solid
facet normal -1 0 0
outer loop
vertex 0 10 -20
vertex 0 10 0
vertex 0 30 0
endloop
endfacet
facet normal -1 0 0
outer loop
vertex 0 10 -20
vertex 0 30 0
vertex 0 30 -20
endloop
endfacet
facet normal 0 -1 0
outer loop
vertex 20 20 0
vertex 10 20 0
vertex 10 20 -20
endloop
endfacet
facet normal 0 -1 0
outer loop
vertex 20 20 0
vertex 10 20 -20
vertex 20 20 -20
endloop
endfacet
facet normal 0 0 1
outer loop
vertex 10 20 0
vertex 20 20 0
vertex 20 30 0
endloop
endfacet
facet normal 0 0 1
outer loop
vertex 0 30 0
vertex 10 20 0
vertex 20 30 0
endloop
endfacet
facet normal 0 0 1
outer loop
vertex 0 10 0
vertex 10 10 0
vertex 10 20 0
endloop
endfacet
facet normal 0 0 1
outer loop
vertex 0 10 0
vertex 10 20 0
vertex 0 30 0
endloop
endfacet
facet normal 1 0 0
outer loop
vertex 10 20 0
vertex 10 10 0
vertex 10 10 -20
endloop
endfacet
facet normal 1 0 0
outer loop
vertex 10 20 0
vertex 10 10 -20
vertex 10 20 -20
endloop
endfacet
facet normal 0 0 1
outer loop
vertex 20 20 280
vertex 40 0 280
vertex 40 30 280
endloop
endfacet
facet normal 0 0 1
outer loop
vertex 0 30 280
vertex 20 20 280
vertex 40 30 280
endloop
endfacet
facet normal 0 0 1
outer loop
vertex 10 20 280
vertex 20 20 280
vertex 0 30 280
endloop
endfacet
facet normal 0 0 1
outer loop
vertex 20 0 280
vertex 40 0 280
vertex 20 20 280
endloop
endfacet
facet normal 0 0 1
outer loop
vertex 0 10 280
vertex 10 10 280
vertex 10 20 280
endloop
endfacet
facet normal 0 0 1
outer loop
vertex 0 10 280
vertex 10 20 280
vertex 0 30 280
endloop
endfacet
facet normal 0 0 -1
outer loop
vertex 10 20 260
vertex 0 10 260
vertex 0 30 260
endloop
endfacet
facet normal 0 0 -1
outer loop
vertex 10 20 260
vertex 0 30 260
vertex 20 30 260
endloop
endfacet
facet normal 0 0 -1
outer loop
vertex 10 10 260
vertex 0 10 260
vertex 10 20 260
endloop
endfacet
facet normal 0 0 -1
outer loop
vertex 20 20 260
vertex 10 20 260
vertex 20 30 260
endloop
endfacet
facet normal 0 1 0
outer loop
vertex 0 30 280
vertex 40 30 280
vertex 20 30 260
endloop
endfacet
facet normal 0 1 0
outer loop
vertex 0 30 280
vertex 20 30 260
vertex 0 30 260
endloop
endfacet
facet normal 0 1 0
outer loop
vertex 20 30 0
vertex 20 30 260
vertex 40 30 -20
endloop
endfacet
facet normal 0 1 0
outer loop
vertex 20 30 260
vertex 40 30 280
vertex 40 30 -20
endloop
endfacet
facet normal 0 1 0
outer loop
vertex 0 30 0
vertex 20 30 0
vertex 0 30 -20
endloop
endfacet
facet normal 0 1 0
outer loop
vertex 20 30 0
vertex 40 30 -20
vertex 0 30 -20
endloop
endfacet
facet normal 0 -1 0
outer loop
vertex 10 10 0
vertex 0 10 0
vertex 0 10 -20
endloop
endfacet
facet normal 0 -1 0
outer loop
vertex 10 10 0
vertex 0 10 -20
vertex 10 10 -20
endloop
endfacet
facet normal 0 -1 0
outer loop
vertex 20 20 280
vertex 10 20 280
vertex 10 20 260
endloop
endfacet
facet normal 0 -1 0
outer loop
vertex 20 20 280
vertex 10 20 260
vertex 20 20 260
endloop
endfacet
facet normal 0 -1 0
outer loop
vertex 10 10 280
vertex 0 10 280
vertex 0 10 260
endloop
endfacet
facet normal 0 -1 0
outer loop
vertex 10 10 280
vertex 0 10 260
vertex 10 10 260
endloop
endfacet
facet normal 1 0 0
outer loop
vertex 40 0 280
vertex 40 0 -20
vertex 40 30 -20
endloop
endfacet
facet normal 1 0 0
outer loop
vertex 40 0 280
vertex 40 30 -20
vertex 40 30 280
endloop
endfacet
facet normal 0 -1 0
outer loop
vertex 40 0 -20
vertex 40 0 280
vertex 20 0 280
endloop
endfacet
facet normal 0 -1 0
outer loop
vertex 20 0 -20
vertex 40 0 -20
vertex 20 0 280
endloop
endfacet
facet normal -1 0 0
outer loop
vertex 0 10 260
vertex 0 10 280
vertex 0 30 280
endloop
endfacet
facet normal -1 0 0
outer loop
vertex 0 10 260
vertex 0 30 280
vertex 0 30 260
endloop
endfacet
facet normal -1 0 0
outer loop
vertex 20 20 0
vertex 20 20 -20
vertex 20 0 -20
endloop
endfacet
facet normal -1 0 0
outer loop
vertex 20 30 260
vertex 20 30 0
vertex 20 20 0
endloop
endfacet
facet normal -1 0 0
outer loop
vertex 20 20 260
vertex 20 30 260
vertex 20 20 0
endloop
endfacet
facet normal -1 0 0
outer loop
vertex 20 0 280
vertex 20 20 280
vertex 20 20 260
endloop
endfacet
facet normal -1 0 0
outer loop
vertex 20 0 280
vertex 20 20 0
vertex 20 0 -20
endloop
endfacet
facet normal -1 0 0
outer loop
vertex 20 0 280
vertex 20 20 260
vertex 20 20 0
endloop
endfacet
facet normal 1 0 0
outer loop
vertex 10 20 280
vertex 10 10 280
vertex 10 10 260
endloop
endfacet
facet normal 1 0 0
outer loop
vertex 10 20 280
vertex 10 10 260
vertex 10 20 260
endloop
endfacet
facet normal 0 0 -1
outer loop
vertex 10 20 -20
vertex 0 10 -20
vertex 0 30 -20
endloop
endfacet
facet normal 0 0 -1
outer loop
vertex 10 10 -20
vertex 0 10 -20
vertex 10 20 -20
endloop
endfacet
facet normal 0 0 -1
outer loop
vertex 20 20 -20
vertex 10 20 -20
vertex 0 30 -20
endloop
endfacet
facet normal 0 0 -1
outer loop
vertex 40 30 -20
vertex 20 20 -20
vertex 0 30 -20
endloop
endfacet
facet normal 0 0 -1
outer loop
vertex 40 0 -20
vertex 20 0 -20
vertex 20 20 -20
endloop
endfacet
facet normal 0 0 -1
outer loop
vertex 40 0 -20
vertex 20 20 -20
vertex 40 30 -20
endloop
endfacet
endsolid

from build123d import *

# Parameters (mm, degrees)
BOSS_EXTRUDE1_DEPTH     = 30
CUT_EXTRUDE1_DEPTH      = 1
CUT_EXTRUDE1_DEPTH_BACK = 301


with BuildPart() as part:
    # Sketch3 → Boss-Extrude1 (new body)
    with BuildSketch(Plane(origin=(0, 0, 0), x_dir=(1, 0, 0), z_dir=(0, 1, 0))):
        Polygon((0, 0), (0, 20), (40, 20), (40, -280), (0, -280), (0, -260), (20, -260), (20, 0), align=None)
    extrude(amount=BOSS_EXTRUDE1_DEPTH)

    # Sketch4 → Cut-Extrude1 (cut, two sides)
    with BuildSketch(Plane.XY.offset(280)) as cut_extrude1_sk:
        Polygon((0, 10), (10, 10), (10, 20), (20, 20), (20, 0), (0, 0), align=None)
    extrude(amount=CUT_EXTRUDE1_DEPTH, mode=Mode.SUBTRACT)
    extrude(cut_extrude1_sk.sketch, amount=-CUT_EXTRUDE1_DEPTH_BACK, mode=Mode.SUBTRACT)


solid = part.part
